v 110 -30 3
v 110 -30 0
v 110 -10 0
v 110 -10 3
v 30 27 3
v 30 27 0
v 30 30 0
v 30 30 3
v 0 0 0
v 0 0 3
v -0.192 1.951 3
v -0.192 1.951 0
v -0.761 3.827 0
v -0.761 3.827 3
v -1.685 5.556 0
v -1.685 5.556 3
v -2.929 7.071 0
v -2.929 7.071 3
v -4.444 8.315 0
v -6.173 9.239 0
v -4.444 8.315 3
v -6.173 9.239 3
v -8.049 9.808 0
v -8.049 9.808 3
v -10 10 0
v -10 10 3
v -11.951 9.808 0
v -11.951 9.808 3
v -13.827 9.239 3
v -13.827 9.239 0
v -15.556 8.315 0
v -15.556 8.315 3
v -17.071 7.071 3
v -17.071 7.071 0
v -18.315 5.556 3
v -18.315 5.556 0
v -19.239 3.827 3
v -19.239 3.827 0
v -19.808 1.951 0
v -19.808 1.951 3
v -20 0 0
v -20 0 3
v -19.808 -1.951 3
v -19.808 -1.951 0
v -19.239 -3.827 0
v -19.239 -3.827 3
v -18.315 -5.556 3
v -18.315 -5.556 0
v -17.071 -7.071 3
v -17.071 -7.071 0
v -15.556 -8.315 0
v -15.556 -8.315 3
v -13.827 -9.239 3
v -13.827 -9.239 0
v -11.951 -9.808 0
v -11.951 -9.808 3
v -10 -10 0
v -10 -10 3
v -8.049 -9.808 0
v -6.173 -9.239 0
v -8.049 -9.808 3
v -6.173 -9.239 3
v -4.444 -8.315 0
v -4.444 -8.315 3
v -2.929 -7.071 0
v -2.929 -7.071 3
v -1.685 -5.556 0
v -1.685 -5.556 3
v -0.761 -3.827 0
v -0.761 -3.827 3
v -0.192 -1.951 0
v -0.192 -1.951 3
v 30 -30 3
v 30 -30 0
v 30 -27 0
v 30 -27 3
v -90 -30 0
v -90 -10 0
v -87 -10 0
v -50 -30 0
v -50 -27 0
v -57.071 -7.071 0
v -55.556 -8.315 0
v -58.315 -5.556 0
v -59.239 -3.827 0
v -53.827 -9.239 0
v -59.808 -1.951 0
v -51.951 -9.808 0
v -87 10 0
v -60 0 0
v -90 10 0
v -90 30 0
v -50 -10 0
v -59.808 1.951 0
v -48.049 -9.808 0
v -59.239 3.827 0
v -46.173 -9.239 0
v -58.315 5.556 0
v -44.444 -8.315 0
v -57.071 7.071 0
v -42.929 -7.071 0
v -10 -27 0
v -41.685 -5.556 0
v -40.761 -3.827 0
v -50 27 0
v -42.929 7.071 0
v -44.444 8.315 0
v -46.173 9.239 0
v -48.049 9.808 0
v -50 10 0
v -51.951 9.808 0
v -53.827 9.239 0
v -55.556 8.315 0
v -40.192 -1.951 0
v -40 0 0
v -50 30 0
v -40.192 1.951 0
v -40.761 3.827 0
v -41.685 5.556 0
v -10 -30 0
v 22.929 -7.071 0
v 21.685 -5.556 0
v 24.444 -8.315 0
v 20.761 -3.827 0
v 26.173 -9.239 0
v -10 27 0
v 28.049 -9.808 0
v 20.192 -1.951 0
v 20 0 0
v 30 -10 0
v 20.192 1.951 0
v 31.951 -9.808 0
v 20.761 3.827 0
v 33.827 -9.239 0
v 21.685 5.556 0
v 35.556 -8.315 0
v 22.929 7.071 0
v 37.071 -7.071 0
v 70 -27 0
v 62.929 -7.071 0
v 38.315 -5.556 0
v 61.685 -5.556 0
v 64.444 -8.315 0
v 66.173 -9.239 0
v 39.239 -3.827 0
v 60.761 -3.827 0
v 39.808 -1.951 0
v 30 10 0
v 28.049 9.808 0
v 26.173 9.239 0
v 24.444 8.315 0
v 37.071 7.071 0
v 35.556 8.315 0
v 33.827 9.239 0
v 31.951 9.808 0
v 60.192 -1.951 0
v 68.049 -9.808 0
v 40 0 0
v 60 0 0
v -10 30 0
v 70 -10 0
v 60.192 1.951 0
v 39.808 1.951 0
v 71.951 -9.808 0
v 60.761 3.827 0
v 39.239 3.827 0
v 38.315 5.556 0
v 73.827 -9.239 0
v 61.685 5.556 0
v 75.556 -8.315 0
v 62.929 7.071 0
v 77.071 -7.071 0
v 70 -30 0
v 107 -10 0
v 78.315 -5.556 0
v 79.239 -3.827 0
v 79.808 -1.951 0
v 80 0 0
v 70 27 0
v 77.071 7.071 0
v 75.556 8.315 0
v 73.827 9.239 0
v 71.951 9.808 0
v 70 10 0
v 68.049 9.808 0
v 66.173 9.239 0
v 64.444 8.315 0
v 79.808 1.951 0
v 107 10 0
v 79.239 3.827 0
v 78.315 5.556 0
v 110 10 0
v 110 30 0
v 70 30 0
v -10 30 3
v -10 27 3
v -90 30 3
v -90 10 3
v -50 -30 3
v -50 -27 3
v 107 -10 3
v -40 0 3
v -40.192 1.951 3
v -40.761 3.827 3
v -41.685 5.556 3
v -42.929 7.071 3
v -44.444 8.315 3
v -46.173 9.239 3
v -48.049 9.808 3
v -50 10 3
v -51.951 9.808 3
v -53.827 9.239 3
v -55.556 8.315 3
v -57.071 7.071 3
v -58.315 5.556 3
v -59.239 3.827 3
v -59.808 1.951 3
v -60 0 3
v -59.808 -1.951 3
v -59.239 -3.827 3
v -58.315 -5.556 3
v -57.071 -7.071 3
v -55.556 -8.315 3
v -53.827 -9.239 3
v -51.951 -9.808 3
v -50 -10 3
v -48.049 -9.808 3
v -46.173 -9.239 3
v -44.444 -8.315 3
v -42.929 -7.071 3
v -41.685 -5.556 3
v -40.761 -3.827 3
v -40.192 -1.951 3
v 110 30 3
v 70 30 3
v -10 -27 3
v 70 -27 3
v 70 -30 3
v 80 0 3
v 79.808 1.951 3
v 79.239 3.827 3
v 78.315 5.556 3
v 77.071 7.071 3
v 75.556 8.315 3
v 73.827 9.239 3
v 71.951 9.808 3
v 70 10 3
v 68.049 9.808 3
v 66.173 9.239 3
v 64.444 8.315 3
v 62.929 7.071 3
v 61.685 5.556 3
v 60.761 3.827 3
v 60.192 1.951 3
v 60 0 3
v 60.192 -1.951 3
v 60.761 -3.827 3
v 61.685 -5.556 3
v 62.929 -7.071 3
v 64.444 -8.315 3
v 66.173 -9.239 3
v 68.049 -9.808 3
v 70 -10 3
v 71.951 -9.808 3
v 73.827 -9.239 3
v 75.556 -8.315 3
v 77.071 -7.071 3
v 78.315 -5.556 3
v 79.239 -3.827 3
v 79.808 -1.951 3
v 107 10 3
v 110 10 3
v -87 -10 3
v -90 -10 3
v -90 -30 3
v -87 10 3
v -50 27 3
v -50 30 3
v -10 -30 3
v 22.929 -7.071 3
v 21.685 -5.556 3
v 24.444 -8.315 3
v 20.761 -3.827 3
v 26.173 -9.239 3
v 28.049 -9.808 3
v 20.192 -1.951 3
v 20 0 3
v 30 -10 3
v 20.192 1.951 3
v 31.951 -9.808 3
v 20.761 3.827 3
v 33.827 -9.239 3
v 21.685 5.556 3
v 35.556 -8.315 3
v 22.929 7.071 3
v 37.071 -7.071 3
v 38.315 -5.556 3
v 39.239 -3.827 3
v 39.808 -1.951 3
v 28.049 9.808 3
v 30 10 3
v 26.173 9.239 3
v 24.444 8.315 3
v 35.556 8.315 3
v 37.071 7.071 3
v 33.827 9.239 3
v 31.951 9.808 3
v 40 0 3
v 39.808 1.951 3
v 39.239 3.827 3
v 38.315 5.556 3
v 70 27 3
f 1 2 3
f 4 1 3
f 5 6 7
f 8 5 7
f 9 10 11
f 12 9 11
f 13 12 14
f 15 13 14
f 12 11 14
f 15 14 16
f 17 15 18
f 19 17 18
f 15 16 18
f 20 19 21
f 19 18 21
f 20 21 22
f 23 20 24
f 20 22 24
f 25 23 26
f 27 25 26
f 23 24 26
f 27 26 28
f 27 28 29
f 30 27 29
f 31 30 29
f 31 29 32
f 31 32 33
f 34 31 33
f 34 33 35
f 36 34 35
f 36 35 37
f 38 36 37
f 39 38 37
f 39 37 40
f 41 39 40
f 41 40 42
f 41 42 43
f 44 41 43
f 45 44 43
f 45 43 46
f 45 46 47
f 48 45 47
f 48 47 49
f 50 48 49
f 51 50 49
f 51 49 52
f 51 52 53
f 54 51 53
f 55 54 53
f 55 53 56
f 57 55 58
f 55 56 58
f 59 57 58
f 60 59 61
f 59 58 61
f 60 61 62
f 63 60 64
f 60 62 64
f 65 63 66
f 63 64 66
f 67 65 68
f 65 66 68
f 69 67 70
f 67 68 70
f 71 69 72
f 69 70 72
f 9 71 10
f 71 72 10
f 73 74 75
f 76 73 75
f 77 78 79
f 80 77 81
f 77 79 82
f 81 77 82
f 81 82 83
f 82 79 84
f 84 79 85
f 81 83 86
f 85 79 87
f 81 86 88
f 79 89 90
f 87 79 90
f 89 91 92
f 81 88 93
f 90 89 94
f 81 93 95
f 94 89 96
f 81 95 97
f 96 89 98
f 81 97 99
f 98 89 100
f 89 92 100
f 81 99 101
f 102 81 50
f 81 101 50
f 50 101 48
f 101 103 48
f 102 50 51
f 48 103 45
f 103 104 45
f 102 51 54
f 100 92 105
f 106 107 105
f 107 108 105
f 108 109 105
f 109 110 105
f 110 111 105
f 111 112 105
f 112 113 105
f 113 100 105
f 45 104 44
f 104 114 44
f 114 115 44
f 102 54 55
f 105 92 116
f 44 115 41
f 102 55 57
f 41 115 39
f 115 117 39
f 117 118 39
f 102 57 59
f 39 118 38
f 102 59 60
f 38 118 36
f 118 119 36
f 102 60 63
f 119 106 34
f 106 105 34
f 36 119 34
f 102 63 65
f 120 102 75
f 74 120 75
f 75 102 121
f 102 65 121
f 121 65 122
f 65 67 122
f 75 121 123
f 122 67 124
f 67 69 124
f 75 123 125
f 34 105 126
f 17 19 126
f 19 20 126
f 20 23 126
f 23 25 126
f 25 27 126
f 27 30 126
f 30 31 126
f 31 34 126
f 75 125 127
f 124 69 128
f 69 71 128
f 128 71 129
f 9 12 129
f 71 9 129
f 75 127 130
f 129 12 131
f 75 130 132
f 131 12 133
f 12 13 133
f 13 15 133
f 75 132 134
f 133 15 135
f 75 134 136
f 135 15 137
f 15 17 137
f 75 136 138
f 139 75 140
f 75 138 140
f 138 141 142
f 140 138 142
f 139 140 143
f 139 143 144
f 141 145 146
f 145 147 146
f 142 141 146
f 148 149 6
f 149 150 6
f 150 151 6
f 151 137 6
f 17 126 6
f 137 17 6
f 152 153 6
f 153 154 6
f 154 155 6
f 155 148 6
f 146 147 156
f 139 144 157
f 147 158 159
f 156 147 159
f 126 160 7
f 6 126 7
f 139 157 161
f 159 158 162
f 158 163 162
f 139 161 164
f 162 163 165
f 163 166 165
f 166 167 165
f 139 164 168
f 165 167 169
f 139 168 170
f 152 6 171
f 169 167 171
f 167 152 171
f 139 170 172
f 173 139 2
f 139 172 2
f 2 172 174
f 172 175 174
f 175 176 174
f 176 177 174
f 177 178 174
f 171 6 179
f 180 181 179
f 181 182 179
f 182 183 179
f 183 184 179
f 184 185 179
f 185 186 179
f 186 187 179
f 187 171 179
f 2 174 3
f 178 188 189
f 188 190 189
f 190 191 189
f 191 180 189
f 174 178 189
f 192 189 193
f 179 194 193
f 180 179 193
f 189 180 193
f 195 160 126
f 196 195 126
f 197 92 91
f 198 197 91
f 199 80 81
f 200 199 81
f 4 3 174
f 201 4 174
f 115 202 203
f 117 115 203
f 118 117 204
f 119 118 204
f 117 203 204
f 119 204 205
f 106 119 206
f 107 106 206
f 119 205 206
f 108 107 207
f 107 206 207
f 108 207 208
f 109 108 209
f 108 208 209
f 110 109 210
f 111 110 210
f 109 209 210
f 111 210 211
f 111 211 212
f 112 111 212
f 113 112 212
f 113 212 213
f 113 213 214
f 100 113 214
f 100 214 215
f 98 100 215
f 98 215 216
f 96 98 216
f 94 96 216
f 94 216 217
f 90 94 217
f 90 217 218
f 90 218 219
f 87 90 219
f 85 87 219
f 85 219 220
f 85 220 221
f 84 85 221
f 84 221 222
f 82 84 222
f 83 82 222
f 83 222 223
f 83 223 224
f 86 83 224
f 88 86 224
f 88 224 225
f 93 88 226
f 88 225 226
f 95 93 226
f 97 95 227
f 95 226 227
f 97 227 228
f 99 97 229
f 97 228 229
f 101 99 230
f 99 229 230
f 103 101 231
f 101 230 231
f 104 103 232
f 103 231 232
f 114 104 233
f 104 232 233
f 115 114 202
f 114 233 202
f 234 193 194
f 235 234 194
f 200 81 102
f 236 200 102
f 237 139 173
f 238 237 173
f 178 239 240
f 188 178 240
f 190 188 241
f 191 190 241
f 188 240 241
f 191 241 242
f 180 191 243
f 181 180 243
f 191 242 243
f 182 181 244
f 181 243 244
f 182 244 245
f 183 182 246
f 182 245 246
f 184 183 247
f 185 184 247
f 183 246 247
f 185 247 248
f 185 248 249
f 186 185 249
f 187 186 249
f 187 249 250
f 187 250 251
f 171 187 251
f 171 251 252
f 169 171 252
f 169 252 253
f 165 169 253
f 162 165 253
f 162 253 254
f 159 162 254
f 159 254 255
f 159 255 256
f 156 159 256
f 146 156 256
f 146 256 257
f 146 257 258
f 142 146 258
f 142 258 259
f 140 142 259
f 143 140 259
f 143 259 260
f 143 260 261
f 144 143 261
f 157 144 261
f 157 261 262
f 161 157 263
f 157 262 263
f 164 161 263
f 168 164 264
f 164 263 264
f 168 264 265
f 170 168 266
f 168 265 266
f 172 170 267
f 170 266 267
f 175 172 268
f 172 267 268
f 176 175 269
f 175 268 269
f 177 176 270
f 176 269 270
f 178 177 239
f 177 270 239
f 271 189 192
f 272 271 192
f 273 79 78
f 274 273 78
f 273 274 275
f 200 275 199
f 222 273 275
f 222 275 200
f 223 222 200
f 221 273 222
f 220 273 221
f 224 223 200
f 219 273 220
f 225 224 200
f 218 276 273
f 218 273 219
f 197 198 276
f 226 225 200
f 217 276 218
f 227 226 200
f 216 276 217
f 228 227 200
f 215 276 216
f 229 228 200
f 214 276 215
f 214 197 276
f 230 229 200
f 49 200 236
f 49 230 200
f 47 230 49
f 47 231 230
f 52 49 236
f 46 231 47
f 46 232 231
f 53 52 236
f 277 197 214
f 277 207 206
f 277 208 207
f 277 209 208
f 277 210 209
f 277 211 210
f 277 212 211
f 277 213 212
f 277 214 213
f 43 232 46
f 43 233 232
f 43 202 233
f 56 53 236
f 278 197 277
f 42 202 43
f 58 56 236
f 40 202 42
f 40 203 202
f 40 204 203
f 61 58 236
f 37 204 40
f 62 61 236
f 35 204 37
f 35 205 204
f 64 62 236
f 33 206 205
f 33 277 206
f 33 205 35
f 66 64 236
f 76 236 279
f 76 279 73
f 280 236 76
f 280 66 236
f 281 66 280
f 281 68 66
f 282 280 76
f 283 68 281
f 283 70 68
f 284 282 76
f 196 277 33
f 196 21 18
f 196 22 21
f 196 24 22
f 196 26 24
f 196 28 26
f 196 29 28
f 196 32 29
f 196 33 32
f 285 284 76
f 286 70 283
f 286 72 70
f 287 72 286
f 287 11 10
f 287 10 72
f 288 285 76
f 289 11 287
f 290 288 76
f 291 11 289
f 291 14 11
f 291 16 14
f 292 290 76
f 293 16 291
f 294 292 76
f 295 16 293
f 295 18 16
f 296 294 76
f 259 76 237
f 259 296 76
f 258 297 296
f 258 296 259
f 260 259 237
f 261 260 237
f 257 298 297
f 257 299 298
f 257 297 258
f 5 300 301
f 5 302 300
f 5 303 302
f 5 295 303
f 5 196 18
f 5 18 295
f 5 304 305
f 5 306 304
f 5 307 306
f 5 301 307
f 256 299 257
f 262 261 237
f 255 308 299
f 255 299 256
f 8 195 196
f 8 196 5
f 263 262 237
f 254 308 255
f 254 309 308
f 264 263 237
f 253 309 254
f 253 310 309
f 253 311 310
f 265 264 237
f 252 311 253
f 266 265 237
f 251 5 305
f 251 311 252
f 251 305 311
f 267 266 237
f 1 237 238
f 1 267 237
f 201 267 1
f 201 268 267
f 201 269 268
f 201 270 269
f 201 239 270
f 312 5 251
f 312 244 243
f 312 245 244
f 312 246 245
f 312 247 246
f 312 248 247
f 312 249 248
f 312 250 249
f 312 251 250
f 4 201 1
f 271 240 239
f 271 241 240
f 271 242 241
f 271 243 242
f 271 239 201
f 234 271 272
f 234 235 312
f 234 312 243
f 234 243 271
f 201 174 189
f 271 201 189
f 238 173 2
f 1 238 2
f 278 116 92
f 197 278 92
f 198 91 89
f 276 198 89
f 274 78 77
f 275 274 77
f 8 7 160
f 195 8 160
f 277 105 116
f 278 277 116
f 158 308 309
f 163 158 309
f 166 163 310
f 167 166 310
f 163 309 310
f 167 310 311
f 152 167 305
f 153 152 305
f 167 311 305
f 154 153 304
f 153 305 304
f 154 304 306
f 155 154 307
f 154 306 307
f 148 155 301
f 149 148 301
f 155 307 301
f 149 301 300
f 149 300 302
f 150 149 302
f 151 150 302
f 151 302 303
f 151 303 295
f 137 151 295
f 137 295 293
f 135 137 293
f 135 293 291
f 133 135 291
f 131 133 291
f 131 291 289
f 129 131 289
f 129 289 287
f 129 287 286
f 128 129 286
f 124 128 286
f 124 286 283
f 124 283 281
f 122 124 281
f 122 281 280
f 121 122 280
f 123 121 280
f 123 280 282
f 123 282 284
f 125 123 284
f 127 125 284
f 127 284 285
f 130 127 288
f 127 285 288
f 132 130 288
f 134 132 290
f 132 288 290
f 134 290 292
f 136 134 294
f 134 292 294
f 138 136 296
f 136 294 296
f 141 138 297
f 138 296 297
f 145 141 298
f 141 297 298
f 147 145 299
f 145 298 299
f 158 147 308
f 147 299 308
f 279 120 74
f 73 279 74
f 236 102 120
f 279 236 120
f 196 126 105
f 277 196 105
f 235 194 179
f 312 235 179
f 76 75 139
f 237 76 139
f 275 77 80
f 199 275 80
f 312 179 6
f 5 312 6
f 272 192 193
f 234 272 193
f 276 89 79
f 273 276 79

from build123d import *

# Parameters (mm, degrees)
BOSS_EXTRUDE1_DEPTH = 3
SKETCH2_R           = 10
CUT_EXTRUDE1_DEPTH  = 115.057003292


with BuildPart() as part:
    # Sketch1 → Boss-Extrude1 (new body)
    with BuildSketch(Plane.XY):
        Polygon((-50, 30), (-90, 30), (-90, 10), (-87, 10), (-87, -10), (-90, -10), (-90, -30), (-50, -30), (-50, -27), (-10, -27), (-10, -30), (30, -30), (30, -27), (70, -27), (70, -30), (71.400928912, -30), (110, -30), (110, -10), (107, -10), (107, 10), (110, 10), (110, 30), (71.400928912, 30), (70, 30), (70, 27), (30, 27), (30, 30), (-10, 30), (-10, 27), (-50, 27), align=None)
    extrude(amount=BOSS_EXTRUDE1_DEPTH)

    # Sketch2 → Cut-Extrude1 (cut, through all)
    with BuildSketch(Plane.XY.offset(3)):
        with Locations((-50, 0)):
            Circle(SKETCH2_R)
        with Locations((-10, 0)):
            Circle(SKETCH2_R)
        with Locations((30, 0)):
            Circle(SKETCH2_R)
        with Locations((70, 0)):
            Circle(SKETCH2_R)
    extrude(amount=-CUT_EXTRUDE1_DEPTH, mode=Mode.SUBTRACT)


solid = part.part
